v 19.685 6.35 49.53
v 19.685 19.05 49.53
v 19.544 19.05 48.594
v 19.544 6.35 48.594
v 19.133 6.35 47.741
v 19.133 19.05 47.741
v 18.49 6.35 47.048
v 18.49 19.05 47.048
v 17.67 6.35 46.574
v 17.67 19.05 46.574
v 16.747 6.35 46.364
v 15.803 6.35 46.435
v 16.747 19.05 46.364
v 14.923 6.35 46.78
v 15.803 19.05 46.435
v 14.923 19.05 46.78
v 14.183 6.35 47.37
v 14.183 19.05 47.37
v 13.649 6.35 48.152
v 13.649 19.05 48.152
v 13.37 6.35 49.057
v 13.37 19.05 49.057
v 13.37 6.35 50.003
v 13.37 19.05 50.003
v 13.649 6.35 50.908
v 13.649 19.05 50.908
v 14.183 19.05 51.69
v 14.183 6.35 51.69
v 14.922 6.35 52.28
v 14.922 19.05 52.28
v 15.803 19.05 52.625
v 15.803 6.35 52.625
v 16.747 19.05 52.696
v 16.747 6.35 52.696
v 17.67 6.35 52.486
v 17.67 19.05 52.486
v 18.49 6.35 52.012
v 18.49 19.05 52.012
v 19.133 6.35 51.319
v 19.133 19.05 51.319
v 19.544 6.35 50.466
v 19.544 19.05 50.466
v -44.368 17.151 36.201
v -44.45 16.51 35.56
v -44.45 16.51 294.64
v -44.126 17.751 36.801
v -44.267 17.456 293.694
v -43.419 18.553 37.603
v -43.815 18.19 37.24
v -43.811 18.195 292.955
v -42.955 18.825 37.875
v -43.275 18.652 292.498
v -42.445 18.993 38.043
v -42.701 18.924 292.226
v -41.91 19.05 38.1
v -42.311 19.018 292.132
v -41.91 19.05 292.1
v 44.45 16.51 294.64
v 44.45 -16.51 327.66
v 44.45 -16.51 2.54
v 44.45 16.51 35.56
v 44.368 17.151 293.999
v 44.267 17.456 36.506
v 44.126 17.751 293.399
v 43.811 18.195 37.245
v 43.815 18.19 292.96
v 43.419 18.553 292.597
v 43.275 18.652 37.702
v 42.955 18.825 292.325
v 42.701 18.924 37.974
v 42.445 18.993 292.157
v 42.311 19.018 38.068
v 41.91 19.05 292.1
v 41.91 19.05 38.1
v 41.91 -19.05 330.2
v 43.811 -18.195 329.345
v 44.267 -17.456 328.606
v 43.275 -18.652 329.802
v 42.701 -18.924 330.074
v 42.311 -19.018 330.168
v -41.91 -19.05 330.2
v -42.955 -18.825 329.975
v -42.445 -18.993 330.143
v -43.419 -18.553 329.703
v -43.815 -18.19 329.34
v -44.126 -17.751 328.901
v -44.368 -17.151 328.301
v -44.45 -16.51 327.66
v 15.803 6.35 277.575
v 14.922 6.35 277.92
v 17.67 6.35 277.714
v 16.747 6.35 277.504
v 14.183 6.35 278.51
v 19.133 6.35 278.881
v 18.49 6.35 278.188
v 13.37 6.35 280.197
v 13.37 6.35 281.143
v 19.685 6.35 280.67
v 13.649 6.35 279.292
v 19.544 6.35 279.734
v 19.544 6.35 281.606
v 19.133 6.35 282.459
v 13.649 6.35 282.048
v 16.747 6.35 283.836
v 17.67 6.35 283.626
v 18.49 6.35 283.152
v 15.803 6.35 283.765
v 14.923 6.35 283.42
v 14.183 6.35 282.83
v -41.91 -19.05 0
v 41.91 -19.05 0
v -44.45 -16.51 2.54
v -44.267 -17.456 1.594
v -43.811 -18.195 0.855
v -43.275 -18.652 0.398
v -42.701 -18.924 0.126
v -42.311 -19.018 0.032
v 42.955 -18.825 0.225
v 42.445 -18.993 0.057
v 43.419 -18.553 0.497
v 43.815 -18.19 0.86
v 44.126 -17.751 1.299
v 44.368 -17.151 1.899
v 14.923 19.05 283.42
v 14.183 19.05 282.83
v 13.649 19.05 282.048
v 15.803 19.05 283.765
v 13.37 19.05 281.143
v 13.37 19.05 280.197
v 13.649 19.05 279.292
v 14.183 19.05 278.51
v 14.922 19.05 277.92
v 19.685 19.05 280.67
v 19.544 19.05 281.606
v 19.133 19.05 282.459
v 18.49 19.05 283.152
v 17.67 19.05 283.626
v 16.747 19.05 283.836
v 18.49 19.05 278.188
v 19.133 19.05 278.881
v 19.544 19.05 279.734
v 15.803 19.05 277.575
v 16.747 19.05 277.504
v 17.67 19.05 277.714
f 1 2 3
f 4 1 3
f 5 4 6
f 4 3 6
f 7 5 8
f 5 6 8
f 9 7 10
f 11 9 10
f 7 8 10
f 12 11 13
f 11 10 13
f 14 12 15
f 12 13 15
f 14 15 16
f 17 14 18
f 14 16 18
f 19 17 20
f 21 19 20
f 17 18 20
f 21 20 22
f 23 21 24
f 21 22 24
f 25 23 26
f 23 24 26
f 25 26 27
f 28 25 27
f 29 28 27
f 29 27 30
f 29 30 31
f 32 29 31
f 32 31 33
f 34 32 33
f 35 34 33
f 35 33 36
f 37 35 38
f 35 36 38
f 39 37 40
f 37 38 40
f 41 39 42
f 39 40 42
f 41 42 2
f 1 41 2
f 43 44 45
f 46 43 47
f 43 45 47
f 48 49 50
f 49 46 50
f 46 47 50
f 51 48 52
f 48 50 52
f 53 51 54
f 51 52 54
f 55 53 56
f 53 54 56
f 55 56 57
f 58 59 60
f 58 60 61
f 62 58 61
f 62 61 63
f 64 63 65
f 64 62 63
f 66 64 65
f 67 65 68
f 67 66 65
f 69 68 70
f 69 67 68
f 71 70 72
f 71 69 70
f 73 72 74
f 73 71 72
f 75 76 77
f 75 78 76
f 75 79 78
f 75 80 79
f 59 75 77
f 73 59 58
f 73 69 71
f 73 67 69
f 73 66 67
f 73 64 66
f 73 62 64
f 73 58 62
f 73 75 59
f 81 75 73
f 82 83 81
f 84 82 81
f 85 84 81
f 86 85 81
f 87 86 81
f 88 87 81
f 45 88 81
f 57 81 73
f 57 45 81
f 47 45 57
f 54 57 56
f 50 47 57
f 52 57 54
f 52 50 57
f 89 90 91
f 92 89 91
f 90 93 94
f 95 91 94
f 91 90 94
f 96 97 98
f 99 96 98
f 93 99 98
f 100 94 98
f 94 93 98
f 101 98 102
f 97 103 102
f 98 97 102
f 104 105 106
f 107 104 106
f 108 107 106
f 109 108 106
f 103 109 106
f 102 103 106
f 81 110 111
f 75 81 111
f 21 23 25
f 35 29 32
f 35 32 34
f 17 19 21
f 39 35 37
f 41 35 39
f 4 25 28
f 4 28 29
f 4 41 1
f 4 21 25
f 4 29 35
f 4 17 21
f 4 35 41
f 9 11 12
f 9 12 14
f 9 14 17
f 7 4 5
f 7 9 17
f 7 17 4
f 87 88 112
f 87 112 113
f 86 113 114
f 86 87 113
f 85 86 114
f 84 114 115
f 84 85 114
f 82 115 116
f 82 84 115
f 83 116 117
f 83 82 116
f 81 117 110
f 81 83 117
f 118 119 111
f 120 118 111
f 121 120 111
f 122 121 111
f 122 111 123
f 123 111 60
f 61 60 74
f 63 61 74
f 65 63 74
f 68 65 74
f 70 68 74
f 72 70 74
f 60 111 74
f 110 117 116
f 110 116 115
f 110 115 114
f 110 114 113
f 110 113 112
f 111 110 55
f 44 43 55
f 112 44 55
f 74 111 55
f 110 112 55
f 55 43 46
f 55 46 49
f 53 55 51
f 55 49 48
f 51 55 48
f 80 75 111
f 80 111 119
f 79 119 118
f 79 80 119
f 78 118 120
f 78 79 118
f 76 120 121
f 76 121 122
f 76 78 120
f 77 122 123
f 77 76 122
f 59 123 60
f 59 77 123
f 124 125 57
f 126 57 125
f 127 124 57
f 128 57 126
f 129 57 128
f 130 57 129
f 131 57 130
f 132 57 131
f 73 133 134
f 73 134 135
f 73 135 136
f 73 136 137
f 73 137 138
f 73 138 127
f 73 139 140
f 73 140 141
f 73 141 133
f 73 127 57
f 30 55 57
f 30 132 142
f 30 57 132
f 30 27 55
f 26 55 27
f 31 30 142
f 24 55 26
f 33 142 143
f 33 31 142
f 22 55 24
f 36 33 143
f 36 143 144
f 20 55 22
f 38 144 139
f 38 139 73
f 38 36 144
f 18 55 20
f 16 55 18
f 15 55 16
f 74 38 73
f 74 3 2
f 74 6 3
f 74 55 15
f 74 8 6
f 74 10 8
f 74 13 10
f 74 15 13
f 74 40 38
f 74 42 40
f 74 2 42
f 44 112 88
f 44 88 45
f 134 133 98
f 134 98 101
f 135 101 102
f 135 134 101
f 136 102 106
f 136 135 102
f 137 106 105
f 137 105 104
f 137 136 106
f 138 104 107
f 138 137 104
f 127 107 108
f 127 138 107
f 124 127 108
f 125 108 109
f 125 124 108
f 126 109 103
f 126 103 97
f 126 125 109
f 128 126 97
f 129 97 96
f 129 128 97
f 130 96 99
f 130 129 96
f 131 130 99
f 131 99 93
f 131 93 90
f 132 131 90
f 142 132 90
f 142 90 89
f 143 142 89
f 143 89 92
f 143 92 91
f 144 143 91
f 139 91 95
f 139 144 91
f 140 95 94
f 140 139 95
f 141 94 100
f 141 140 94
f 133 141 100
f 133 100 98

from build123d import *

# Parameters (mm, degrees)
SKETCH1_W           = 88.9
SKETCH1_H           = 38.1
BOSS_EXTRUDE1_DEPTH = 330.2
FILLET1_R           = 2.54
CUT_EXTRUDE1_DEPTH  = 406.4
SKETCH3_R           = 3.175
CUT_EXTRUDE2_DEPTH  = 12.7


with BuildPart() as part:
    # Sketch1 → Boss-Extrude1 (new body)
    with BuildSketch(Plane.XY):
        Rectangle(SKETCH1_W, SKETCH1_H)
    extrude(amount=BOSS_EXTRUDE1_DEPTH)

    # Fillet1
    fillet1_edges = [part.edges().sort_by_distance(p)[0] for p in [
        (44.45, -19.05, 165.1),
        (-44.45, -19.05, 165.1),
        (-44.45, 19.05, 165.1),
        (44.45, 19.05, 165.1),
    ]]
    fillet(fillet1_edges, radius=FILLET1_R)

    # Sketch2 → Cut-Extrude1 (cut)
    with BuildSketch(Plane.ZY.offset(44.45)):
        Polygon((0, 19.05), (0, -19.05), (38.1, 19.05), align=None)
    cut_extrude1 = extrude(amount=-CUT_EXTRUDE1_DEPTH, mode=Mode.SUBTRACT)

    # Mirror1: Cut-Extrude1 across plane
    add(cut_extrude1.mirror(Plane.XY.offset(165.1)), mode=Mode.SUBTRACT)

    # Sketch3 → Cut-Extrude2 (cut)
    with BuildSketch(Plane(origin=(0, 19.05, 0), x_dir=(1, 0, 0), z_dir=(0, 1, 0))):
        with Locations((16.51, -49.53)):
            Circle(SKETCH3_R)
    cut_extrude2 = extrude(amount=-CUT_EXTRUDE2_DEPTH, mode=Mode.SUBTRACT)

    # Mirror2: Cut-Extrude2 across plane
    add(cut_extrude2.mirror(Plane.XY.offset(165.1)), mode=Mode.SUBTRACT)


solid = part.part
